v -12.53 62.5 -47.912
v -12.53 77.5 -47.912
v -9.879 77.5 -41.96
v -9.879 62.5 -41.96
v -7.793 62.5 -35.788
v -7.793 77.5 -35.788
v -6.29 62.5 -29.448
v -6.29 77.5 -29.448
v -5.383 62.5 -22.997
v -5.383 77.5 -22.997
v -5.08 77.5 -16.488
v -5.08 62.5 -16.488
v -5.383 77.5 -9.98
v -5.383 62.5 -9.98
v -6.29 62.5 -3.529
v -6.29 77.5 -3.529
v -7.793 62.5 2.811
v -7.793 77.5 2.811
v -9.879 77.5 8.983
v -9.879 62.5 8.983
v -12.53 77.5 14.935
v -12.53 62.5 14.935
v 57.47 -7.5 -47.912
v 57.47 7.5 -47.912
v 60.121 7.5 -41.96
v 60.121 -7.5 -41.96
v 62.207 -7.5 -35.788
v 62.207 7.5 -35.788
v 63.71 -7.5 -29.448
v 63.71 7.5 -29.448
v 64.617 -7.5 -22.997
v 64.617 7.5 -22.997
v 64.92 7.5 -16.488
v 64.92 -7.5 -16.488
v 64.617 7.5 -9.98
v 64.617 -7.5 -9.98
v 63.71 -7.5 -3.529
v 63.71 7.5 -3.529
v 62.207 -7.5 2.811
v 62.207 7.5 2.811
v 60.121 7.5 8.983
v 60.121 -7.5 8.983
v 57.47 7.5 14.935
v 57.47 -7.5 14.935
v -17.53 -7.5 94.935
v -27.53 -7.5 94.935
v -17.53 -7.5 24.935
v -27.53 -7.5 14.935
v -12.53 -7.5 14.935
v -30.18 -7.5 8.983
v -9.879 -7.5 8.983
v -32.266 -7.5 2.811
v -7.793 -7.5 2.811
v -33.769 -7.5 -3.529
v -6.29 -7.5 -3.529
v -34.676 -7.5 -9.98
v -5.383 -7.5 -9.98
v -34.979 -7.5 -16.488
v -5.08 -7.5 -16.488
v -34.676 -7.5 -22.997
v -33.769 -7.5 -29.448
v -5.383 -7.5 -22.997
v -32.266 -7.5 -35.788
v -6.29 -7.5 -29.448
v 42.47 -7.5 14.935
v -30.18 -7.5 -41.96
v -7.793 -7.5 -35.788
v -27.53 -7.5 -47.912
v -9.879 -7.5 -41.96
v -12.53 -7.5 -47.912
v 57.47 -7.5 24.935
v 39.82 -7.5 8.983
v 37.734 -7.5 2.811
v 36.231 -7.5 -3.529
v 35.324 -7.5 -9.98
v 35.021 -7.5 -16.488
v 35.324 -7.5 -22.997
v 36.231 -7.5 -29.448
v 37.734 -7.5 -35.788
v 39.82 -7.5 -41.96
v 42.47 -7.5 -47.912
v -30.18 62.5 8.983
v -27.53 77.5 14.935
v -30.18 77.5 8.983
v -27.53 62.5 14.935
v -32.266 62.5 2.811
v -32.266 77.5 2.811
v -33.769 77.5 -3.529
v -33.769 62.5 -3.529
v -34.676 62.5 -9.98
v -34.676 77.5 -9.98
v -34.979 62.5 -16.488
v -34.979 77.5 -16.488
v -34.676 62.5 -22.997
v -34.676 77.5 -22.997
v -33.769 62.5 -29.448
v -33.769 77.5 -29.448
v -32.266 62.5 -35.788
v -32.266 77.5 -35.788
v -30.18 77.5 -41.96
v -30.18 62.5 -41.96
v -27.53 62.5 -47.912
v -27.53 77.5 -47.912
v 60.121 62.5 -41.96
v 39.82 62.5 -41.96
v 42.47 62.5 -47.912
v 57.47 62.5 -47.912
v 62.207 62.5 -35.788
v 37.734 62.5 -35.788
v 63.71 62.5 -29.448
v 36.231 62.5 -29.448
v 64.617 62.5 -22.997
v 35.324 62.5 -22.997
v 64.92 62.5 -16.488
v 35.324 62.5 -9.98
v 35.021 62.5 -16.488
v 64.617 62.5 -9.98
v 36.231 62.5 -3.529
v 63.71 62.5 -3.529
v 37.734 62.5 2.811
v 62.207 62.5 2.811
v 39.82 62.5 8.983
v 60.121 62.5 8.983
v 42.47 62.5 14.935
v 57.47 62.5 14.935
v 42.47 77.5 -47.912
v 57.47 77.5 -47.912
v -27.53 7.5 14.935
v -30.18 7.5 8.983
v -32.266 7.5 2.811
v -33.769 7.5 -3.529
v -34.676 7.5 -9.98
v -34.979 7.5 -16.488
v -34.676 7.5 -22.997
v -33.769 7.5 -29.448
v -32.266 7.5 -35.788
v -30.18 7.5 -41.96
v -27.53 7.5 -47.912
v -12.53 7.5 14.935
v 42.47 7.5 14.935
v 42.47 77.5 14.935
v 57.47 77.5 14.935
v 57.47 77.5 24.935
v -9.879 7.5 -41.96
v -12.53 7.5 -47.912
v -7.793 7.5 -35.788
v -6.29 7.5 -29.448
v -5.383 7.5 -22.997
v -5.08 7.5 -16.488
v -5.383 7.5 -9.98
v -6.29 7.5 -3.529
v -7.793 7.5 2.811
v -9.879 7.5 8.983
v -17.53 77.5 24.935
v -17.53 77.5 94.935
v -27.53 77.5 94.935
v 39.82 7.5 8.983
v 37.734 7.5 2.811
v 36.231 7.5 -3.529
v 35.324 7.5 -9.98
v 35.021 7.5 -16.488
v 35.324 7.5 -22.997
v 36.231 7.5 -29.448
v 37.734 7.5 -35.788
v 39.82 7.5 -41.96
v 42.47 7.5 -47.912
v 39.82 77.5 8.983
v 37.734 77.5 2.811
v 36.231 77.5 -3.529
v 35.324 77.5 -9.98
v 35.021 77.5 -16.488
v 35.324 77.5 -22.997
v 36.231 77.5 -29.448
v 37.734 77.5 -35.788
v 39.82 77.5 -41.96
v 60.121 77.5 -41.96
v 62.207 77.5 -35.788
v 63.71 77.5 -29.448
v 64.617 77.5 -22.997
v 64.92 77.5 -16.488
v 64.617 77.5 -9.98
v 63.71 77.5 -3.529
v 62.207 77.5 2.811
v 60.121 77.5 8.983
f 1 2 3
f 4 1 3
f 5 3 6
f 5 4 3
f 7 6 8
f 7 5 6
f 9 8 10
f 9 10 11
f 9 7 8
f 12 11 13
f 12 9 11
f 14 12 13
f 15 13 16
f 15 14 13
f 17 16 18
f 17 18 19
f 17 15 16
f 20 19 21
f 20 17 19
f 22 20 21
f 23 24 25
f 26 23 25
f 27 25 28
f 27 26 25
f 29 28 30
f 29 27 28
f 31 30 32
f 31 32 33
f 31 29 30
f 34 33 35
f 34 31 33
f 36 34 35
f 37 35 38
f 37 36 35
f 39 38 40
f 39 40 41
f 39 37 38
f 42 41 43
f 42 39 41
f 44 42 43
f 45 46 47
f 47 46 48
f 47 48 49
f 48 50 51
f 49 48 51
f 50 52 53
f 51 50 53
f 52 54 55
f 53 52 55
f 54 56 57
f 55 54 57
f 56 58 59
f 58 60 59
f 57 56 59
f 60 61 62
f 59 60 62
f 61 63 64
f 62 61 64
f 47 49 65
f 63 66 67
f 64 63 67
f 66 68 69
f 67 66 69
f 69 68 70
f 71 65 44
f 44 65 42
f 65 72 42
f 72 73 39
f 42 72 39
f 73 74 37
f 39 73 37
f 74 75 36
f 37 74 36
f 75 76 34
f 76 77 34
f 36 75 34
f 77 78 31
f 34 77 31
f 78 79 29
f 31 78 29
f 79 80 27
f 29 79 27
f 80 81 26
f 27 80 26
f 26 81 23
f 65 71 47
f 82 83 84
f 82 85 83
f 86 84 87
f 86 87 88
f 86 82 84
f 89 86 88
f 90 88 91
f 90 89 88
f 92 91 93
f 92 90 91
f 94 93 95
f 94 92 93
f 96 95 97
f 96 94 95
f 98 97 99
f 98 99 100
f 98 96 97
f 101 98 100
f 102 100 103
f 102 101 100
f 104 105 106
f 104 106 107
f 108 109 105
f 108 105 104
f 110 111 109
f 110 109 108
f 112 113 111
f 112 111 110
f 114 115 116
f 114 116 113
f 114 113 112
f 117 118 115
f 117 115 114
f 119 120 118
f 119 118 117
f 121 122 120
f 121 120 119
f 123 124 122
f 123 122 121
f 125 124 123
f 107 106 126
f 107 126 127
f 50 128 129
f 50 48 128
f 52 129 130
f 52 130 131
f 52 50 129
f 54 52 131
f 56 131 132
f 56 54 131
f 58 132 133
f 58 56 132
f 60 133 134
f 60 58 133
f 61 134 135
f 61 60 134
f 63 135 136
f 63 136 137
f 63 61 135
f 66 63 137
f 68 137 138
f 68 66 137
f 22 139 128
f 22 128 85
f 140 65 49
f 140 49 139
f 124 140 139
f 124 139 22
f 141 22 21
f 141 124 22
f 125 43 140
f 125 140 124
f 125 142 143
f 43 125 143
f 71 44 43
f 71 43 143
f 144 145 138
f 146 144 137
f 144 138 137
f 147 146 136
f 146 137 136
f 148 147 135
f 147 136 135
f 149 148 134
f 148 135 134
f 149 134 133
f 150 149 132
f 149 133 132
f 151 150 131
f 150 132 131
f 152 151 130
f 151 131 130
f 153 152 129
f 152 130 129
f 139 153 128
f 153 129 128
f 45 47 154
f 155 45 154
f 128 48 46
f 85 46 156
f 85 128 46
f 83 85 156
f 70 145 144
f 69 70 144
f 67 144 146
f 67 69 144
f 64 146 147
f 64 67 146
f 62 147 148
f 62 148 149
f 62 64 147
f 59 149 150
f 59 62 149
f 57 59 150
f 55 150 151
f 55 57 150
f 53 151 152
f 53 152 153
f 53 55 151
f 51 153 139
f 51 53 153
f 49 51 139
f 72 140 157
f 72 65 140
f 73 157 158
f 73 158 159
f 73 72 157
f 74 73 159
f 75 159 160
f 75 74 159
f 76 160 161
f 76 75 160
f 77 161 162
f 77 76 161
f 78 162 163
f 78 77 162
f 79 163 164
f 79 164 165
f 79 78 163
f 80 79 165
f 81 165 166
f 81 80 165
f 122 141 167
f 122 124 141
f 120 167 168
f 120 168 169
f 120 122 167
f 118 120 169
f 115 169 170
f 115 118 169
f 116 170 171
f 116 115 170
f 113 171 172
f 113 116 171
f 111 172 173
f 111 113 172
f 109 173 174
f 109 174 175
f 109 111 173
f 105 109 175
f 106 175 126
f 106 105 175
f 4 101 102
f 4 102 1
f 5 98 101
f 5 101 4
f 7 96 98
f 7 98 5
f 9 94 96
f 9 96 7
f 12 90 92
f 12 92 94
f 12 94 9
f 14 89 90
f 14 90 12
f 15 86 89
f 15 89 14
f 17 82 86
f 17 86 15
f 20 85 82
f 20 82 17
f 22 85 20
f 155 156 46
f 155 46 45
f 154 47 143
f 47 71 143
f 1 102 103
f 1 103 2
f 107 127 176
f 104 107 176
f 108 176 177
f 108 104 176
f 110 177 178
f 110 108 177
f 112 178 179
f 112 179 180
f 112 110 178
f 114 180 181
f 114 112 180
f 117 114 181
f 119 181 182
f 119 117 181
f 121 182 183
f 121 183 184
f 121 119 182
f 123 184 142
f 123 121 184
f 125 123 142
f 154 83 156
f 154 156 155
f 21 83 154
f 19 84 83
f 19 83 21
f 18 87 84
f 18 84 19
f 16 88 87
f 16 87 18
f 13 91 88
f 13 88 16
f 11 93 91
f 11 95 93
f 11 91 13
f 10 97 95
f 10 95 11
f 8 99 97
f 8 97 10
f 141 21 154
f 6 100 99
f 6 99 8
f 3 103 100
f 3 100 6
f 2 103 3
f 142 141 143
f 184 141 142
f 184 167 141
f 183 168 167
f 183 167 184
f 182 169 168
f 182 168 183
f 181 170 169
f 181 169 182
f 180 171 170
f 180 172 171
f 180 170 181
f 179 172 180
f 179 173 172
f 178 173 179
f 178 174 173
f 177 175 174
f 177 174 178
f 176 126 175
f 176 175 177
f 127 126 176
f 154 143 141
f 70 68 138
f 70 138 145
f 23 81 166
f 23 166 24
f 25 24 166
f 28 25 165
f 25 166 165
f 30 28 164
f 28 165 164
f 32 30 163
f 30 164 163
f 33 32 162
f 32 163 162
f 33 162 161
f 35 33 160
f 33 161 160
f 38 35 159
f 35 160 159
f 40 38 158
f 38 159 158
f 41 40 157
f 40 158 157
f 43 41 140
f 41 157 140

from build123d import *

# Parameters (mm, degrees)
F1_DEPTH  = 7.5
F5_DEPTH  = 10
F6_DEPTH  = 70
F7_W      = 15
F7_H      = 10
F8_DEPTH  = 70
F9_DEPTH  = 70
F10_W     = 10
F10_H     = 85
F11_DEPTH = 70


with BuildPart() as f1:
    # F0 (on Front) → F1 (new body, symmetric)
    with BuildSketch(Plane.XZ):
        with BuildLine():
            ThreePointArc((-27.5296741368, 14.9347687151), (-34.9790626376, -16.4884870212), (-27.5296741368, -47.9117427575))
            Line((-27.5296741368, -47.9117427575), (-12.5296741368, -47.9117427575))
            ThreePointArc((-12.5296741368, -47.9117427575), (-5.0802856361, -16.4884870212), (-12.5296741368, 14.9347687151))
            Line((-12.5296741368, 14.9347687151), (-27.5296741368, 14.9347687151))
        make_face()
    extrude(amount=F1_DEPTH, both=True)


with BuildPart() as f2_1:
    # F2: copy of F1
    add(f1.part.moved(Location((70, 0, 0))))


with BuildPart() as f3_1:
    # F3: copy of F1
    add(f1.part.moved(Location((0, 70, 0))))


with BuildPart() as f4_1:
    # F4: copy of F2_1
    add(f2_1.part.moved(Location((0, 70, 0))))


with BuildPart() as f1_1:
    add(f1.part)

    # F5 (add): a face of the model
    f5_faces = [f1_1.faces().sort_by_distance(p)[0] for p in [
        (-20.0296741368, 0, 14.9347687151),
    ]]
    extrude(f5_faces, amount=F5_DEPTH)

    # F6 (add): a face of the model
    f6_faces = [f1_1.faces().sort_by_distance(p)[0] for p in [
        (-12.5296741368, 0, 19.9347687151),
    ]]

    add(f2_1.part)  # F6 merges F2_1
    extrude(f6_faces, amount=F6_DEPTH)

    add(f4_1.part)  # F8 merges F4_1
    # F7 (on face) → F8 (join)
    with BuildSketch(Plane(origin=(0, 7.5, 0), x_dir=(-1, 0, 0), z_dir=(0, 1, 0))):
        with Locations((-49.9703258632, 19.9347687151)):
            Rectangle(F7_W, F7_H)
    extrude(amount=F8_DEPTH)

    # F9 (add): a face of the model
    f9_faces = [f1_1.faces().sort_by_distance(p)[0] for p in [
        (42.4703258632, 42.5, 19.9347687151),
    ]]

    add(f3_1.part)  # F9 merges F3_1
    extrude(f9_faces, amount=F9_DEPTH)

    # F10 (on face) → F11 (join)
    with BuildSketch(Plane.XY.offset(24.9347687151)):
        with Locations((-22.5296741368, 35)):
            Rectangle(F10_W, F10_H)
    extrude(amount=F11_DEPTH)


solid = f1_1.part
